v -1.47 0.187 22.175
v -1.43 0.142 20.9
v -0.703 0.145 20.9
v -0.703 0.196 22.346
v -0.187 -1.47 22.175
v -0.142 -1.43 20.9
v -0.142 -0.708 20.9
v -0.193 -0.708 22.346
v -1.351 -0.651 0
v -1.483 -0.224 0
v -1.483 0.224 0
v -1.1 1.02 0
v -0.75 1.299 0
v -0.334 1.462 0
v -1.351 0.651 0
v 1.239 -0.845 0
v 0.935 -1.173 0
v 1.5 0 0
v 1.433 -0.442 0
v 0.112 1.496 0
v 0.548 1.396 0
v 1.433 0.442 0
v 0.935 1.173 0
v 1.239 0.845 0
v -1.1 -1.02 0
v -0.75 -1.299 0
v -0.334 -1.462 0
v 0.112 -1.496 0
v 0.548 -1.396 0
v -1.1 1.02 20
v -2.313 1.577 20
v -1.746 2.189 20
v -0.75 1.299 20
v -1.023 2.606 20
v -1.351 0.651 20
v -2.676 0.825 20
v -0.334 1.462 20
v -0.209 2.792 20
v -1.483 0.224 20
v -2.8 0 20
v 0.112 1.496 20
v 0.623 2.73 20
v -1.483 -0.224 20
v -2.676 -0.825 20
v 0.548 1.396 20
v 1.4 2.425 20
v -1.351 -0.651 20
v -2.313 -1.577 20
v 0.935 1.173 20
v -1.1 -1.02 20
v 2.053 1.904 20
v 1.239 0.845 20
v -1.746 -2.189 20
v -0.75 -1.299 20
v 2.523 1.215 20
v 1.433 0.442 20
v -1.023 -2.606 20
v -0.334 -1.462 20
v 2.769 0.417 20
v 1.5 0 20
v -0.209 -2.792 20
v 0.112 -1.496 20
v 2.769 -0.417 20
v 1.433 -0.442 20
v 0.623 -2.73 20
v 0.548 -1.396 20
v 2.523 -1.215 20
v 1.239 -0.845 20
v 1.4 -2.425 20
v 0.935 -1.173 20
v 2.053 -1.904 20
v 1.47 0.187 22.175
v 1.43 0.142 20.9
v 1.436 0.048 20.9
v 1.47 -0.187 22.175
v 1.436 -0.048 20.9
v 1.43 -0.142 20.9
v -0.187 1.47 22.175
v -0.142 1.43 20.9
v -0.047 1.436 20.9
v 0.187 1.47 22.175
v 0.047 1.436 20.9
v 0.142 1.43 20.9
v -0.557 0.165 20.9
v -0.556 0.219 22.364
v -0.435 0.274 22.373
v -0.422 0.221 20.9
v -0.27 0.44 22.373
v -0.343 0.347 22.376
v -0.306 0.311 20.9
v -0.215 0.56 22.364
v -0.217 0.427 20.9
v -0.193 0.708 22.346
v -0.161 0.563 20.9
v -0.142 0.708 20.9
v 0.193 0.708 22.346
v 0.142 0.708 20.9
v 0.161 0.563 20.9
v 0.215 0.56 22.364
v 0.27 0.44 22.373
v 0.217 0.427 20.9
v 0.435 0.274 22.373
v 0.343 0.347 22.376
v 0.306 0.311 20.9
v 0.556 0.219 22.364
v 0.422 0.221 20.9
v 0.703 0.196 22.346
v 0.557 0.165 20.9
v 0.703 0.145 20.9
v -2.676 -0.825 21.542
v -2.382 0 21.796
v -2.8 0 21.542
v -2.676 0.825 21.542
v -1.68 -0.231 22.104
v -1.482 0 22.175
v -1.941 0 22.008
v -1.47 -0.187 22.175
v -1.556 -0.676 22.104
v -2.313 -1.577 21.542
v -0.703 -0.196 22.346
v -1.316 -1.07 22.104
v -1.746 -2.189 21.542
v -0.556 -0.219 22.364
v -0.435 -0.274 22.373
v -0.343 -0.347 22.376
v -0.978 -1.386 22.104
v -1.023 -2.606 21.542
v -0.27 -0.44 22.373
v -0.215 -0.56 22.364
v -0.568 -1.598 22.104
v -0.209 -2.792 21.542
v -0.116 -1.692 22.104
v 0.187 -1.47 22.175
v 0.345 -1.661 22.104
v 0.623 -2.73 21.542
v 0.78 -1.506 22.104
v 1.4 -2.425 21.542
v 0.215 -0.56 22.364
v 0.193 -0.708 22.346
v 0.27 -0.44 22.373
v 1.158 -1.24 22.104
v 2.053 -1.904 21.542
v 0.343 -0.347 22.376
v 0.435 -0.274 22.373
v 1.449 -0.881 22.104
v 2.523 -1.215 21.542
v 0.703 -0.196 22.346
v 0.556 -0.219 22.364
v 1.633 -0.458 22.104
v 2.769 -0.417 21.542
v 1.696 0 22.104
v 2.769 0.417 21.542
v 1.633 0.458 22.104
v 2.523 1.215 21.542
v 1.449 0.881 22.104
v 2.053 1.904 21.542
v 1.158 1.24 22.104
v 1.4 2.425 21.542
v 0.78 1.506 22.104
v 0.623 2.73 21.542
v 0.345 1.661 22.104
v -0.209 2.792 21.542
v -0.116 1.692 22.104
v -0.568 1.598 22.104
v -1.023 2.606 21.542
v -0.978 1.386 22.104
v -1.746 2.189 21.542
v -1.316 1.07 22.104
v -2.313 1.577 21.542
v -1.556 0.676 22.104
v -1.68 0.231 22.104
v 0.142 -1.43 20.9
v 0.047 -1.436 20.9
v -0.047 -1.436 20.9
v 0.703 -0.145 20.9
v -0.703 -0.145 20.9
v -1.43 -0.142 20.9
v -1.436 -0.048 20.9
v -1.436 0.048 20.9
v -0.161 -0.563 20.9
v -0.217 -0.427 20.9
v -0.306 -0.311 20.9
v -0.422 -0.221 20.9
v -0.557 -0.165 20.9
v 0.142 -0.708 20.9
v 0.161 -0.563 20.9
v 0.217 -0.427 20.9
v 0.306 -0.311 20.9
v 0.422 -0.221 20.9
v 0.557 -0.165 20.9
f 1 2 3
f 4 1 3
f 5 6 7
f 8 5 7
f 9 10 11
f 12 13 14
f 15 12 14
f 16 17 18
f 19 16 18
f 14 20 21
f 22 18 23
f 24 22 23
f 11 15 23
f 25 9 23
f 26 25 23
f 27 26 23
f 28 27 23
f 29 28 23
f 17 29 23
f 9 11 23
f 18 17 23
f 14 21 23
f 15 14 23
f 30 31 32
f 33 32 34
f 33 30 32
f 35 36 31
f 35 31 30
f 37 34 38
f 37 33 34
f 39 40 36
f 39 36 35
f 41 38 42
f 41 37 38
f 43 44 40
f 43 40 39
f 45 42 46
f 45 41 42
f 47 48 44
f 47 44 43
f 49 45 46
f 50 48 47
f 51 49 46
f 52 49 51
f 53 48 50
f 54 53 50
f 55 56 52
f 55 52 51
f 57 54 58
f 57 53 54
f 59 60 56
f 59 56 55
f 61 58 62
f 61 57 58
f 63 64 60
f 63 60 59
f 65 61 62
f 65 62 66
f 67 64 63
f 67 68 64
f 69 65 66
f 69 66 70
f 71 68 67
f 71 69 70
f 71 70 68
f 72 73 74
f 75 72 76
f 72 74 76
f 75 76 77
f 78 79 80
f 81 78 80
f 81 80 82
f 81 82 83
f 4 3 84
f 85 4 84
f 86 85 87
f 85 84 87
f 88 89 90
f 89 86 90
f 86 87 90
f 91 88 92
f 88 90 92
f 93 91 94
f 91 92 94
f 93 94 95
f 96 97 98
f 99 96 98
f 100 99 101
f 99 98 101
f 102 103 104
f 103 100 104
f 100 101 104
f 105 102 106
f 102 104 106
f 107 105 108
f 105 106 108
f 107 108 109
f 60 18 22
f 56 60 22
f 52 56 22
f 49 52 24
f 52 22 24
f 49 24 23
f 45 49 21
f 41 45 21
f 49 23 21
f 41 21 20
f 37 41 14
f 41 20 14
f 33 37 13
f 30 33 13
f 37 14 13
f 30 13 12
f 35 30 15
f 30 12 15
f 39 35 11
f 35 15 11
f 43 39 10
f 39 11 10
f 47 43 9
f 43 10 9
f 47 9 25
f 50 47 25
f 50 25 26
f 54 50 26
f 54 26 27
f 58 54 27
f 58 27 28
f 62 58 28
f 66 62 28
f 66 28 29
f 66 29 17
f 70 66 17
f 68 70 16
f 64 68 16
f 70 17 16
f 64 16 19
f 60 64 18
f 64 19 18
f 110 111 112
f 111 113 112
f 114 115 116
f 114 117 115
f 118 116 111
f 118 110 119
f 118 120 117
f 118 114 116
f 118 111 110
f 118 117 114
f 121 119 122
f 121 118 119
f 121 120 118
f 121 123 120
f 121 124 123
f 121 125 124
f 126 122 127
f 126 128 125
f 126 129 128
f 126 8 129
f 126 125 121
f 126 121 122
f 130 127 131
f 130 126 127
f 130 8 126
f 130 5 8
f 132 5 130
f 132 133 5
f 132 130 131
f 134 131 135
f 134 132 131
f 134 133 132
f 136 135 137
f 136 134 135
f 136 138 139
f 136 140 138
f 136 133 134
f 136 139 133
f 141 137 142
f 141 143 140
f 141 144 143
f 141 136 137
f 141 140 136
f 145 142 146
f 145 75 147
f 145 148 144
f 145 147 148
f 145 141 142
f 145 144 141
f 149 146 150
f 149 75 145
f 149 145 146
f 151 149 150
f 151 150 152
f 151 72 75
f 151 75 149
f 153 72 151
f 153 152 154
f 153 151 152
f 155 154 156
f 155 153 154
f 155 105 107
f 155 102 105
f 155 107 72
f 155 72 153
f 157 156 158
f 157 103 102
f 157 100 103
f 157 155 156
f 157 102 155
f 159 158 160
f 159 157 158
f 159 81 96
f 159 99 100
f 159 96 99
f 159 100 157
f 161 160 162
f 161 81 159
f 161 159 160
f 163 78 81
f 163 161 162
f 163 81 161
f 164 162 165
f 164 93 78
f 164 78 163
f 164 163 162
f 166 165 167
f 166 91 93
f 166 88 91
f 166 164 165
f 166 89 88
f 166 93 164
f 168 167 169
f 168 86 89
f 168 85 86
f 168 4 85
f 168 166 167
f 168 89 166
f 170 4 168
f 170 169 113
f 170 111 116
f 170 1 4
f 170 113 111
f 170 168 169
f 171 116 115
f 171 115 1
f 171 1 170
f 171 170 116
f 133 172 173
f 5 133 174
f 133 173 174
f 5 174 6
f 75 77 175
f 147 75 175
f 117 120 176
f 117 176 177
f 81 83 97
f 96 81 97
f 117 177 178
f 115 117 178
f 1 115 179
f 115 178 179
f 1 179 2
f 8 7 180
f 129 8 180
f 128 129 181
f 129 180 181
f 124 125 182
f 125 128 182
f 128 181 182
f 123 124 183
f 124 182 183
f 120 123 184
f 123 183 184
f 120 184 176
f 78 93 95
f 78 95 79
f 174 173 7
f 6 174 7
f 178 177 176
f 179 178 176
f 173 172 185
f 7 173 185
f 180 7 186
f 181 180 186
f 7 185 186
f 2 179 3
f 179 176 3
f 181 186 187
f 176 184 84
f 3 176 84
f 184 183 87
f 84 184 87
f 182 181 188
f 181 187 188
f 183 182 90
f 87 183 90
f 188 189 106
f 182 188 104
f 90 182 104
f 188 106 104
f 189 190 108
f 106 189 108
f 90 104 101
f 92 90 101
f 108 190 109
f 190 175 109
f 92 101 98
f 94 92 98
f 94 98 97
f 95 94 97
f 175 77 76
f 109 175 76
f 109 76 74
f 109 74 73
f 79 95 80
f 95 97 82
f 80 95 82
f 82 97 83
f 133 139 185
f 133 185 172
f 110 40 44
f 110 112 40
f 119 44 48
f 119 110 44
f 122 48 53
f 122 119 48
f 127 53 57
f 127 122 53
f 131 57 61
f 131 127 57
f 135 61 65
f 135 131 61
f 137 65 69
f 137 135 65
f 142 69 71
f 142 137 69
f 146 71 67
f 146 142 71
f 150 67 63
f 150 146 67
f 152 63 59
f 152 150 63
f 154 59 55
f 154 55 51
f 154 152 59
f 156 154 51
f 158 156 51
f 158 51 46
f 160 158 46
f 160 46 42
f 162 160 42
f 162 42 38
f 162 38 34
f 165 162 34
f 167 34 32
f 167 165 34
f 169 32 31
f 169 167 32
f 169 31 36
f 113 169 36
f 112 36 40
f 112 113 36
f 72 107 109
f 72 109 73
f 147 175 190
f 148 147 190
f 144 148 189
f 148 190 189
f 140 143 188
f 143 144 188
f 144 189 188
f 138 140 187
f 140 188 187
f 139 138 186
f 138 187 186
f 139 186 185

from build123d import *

# Parameters (mm, degrees)
SKETCH1_R          = 1.5
BASE_EXTRUDE_DEPTH = 20
CUT_EXTRUDE1_DEPTH = 1.799999969
CUT_EXTRUDE1_TAPER = 2


with BuildPart() as part:
    # Sketch1 → Base-Extrude (new body)
    with BuildSketch(Plane.XY):
        Circle(SKETCH1_R)
    extrude(amount=BASE_EXTRUDE_DEPTH)

    # Sketch6 → Boss-Revolve2 (revolve)
    with BuildSketch(Plane(origin=(0, 0, 0), x_dir=(1, 0, 0), z_dir=(0, 1, 0)), mode=Mode.PRIVATE) as boss_revolve2_sk:
        with BuildLine():
            Line((0, -20), (2.7999999, -20))
            Line((2.7999999, -20), (2.7999999, -21.54246308))
            ThreePointArc((2.7999999, -21.54246308), (1.46418655, -22.180811406), (0, -22.4))
            Line((0, -22.4), (0, -20))
        make_face()
    revolve(boss_revolve2_sk.sketch.rotate(Axis((0, 0, -0.393620135), (0, 0, 1)), 180), axis=Axis((0, 0, -0.393620135), (0, 0, 1)))

    # Sketch7 → Cut-Extrude1 (cut)
    with BuildSketch(Plane(origin=(0, 0, 22.7000001), x_dir=(-1, 0, 0), z_dir=(0, 0, -1))):
        with BuildLine():
            ThreePointArc((0.205000004, 1.48592565), (0, 1.500000013), (-0.205000004, 1.48592565))
            Line((-0.205000004, 1.48592565), (-0.205000004, 0.708178558))
            ThreePointArc((-0.205000004, 0.708178558), (-0.35072876, 0.355344481), (-0.702967546, 0.208182689))
            Line((-0.702967546, 0.208182689), (-1.48592565, 0.205000004))
            ThreePointArc((-1.48592565, 0.205000004), (-1.500000013, 0), (-1.48592565, -0.205000004))
            Line((-1.48592565, -0.205000004), (-0.702967546, -0.208182689))
            ThreePointArc((-0.702967546, -0.208182689), (-0.35072876, -0.355344481), (-0.205000004, -0.708178558))
            Line((-0.205000004, -0.708178558), (-0.205000004, -1.48592565))
            ThreePointArc((-0.205000004, -1.48592565), (0, -1.500000013), (0.205000004, -1.48592565))
            Line((0.205000004, -1.48592565), (0.205000004, -0.708178558))
            ThreePointArc((0.205000004, -0.708178558), (0.35072876, -0.355344481), (0.702967546, -0.208182689))
            Line((0.702967546, -0.208182689), (1.48592565, -0.205000004))
            ThreePointArc((1.48592565, -0.205000004), (1.500000013, 0), (1.48592565, 0.205000004))
            Line((1.48592565, 0.205000004), (0.702967546, 0.208182689))
            ThreePointArc((0.702967546, 0.208182689), (0.35072876, 0.355344481), (0.205000004, 0.708178558))
            Line((0.205000004, 0.708178558), (0.205000004, 1.48592565))
        make_face()
    extrude(amount=CUT_EXTRUDE1_DEPTH, taper=CUT_EXTRUDE1_TAPER, mode=Mode.SUBTRACT)


solid = part.part
